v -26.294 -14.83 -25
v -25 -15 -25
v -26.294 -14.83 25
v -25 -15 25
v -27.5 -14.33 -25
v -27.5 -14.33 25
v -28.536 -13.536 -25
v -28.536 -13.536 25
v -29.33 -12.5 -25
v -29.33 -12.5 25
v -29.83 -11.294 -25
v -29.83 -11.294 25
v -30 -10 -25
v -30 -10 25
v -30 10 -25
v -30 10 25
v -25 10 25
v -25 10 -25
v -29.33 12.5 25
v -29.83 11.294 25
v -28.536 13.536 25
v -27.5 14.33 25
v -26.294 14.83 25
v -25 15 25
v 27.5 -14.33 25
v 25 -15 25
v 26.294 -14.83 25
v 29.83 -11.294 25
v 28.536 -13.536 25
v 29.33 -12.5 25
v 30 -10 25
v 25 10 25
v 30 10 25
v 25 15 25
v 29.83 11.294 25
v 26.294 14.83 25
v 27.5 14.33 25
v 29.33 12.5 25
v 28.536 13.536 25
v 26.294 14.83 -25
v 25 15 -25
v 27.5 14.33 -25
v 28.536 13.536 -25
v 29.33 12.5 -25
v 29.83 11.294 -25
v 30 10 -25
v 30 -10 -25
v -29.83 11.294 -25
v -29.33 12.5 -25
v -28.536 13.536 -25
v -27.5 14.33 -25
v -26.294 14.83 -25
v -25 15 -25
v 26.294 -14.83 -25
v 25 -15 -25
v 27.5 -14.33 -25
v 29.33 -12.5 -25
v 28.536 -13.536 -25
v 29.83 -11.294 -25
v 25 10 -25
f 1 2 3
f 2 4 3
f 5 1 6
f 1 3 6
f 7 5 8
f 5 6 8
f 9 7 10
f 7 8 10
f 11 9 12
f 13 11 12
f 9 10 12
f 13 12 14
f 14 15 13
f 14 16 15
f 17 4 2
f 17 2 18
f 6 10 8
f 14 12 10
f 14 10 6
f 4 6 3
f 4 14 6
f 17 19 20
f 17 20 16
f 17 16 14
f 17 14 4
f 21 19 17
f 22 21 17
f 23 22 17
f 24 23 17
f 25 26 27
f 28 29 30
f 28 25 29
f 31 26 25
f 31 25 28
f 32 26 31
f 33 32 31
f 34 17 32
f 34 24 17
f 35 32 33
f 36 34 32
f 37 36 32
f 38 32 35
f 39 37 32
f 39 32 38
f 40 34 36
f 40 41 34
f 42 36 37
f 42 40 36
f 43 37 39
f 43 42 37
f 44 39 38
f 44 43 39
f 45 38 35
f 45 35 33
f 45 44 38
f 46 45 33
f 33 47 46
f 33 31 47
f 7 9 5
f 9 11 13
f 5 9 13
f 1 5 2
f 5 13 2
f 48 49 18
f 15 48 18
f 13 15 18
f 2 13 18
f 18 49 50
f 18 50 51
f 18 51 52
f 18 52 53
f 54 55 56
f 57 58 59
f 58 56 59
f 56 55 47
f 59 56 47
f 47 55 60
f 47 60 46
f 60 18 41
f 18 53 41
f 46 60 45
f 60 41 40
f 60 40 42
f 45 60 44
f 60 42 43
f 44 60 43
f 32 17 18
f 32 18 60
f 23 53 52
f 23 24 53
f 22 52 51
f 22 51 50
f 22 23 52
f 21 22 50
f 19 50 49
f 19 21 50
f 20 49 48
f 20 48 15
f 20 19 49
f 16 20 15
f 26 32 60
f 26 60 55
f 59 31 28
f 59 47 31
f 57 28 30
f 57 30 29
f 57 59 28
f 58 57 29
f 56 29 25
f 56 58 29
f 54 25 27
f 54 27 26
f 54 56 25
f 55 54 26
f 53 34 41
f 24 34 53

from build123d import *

# Parameters (mm, degrees)
F1_DEPTH      = 25
F1_DEPTH_BACK = 25
F2_R          = 4.99999


# Not quite as in the source:
# - a fillet or chamfer is up to 0.001 mm smaller than in the source, because OpenCascade refuses the exact size


with BuildPart() as f1:
    # F0 (on Top) → F1 (new body, two sides)
    with BuildSketch(Plane.XY) as f1_sk:
        Polygon((30, 15), (-30, 15), (-30, -15), (-25, -15), (-25, 10), (25, 10), (25, -15), (30, -15), align=None)
    extrude(amount=F1_DEPTH)
    extrude(f1_sk.sketch, amount=-F1_DEPTH_BACK)

    # F2 (radius 5 in the source; OpenCascade refuses exactly that, so slightly less here)
    f2_edges = [f1.edges().sort_by_distance(p)[0] for p in [
        (-30, 15, 0),
        (30, 15, 0),
        (30, -15, 0),
        (-30, -15, 0),
    ]]
    fillet(f2_edges, radius=F2_R)


solid = f1.part
